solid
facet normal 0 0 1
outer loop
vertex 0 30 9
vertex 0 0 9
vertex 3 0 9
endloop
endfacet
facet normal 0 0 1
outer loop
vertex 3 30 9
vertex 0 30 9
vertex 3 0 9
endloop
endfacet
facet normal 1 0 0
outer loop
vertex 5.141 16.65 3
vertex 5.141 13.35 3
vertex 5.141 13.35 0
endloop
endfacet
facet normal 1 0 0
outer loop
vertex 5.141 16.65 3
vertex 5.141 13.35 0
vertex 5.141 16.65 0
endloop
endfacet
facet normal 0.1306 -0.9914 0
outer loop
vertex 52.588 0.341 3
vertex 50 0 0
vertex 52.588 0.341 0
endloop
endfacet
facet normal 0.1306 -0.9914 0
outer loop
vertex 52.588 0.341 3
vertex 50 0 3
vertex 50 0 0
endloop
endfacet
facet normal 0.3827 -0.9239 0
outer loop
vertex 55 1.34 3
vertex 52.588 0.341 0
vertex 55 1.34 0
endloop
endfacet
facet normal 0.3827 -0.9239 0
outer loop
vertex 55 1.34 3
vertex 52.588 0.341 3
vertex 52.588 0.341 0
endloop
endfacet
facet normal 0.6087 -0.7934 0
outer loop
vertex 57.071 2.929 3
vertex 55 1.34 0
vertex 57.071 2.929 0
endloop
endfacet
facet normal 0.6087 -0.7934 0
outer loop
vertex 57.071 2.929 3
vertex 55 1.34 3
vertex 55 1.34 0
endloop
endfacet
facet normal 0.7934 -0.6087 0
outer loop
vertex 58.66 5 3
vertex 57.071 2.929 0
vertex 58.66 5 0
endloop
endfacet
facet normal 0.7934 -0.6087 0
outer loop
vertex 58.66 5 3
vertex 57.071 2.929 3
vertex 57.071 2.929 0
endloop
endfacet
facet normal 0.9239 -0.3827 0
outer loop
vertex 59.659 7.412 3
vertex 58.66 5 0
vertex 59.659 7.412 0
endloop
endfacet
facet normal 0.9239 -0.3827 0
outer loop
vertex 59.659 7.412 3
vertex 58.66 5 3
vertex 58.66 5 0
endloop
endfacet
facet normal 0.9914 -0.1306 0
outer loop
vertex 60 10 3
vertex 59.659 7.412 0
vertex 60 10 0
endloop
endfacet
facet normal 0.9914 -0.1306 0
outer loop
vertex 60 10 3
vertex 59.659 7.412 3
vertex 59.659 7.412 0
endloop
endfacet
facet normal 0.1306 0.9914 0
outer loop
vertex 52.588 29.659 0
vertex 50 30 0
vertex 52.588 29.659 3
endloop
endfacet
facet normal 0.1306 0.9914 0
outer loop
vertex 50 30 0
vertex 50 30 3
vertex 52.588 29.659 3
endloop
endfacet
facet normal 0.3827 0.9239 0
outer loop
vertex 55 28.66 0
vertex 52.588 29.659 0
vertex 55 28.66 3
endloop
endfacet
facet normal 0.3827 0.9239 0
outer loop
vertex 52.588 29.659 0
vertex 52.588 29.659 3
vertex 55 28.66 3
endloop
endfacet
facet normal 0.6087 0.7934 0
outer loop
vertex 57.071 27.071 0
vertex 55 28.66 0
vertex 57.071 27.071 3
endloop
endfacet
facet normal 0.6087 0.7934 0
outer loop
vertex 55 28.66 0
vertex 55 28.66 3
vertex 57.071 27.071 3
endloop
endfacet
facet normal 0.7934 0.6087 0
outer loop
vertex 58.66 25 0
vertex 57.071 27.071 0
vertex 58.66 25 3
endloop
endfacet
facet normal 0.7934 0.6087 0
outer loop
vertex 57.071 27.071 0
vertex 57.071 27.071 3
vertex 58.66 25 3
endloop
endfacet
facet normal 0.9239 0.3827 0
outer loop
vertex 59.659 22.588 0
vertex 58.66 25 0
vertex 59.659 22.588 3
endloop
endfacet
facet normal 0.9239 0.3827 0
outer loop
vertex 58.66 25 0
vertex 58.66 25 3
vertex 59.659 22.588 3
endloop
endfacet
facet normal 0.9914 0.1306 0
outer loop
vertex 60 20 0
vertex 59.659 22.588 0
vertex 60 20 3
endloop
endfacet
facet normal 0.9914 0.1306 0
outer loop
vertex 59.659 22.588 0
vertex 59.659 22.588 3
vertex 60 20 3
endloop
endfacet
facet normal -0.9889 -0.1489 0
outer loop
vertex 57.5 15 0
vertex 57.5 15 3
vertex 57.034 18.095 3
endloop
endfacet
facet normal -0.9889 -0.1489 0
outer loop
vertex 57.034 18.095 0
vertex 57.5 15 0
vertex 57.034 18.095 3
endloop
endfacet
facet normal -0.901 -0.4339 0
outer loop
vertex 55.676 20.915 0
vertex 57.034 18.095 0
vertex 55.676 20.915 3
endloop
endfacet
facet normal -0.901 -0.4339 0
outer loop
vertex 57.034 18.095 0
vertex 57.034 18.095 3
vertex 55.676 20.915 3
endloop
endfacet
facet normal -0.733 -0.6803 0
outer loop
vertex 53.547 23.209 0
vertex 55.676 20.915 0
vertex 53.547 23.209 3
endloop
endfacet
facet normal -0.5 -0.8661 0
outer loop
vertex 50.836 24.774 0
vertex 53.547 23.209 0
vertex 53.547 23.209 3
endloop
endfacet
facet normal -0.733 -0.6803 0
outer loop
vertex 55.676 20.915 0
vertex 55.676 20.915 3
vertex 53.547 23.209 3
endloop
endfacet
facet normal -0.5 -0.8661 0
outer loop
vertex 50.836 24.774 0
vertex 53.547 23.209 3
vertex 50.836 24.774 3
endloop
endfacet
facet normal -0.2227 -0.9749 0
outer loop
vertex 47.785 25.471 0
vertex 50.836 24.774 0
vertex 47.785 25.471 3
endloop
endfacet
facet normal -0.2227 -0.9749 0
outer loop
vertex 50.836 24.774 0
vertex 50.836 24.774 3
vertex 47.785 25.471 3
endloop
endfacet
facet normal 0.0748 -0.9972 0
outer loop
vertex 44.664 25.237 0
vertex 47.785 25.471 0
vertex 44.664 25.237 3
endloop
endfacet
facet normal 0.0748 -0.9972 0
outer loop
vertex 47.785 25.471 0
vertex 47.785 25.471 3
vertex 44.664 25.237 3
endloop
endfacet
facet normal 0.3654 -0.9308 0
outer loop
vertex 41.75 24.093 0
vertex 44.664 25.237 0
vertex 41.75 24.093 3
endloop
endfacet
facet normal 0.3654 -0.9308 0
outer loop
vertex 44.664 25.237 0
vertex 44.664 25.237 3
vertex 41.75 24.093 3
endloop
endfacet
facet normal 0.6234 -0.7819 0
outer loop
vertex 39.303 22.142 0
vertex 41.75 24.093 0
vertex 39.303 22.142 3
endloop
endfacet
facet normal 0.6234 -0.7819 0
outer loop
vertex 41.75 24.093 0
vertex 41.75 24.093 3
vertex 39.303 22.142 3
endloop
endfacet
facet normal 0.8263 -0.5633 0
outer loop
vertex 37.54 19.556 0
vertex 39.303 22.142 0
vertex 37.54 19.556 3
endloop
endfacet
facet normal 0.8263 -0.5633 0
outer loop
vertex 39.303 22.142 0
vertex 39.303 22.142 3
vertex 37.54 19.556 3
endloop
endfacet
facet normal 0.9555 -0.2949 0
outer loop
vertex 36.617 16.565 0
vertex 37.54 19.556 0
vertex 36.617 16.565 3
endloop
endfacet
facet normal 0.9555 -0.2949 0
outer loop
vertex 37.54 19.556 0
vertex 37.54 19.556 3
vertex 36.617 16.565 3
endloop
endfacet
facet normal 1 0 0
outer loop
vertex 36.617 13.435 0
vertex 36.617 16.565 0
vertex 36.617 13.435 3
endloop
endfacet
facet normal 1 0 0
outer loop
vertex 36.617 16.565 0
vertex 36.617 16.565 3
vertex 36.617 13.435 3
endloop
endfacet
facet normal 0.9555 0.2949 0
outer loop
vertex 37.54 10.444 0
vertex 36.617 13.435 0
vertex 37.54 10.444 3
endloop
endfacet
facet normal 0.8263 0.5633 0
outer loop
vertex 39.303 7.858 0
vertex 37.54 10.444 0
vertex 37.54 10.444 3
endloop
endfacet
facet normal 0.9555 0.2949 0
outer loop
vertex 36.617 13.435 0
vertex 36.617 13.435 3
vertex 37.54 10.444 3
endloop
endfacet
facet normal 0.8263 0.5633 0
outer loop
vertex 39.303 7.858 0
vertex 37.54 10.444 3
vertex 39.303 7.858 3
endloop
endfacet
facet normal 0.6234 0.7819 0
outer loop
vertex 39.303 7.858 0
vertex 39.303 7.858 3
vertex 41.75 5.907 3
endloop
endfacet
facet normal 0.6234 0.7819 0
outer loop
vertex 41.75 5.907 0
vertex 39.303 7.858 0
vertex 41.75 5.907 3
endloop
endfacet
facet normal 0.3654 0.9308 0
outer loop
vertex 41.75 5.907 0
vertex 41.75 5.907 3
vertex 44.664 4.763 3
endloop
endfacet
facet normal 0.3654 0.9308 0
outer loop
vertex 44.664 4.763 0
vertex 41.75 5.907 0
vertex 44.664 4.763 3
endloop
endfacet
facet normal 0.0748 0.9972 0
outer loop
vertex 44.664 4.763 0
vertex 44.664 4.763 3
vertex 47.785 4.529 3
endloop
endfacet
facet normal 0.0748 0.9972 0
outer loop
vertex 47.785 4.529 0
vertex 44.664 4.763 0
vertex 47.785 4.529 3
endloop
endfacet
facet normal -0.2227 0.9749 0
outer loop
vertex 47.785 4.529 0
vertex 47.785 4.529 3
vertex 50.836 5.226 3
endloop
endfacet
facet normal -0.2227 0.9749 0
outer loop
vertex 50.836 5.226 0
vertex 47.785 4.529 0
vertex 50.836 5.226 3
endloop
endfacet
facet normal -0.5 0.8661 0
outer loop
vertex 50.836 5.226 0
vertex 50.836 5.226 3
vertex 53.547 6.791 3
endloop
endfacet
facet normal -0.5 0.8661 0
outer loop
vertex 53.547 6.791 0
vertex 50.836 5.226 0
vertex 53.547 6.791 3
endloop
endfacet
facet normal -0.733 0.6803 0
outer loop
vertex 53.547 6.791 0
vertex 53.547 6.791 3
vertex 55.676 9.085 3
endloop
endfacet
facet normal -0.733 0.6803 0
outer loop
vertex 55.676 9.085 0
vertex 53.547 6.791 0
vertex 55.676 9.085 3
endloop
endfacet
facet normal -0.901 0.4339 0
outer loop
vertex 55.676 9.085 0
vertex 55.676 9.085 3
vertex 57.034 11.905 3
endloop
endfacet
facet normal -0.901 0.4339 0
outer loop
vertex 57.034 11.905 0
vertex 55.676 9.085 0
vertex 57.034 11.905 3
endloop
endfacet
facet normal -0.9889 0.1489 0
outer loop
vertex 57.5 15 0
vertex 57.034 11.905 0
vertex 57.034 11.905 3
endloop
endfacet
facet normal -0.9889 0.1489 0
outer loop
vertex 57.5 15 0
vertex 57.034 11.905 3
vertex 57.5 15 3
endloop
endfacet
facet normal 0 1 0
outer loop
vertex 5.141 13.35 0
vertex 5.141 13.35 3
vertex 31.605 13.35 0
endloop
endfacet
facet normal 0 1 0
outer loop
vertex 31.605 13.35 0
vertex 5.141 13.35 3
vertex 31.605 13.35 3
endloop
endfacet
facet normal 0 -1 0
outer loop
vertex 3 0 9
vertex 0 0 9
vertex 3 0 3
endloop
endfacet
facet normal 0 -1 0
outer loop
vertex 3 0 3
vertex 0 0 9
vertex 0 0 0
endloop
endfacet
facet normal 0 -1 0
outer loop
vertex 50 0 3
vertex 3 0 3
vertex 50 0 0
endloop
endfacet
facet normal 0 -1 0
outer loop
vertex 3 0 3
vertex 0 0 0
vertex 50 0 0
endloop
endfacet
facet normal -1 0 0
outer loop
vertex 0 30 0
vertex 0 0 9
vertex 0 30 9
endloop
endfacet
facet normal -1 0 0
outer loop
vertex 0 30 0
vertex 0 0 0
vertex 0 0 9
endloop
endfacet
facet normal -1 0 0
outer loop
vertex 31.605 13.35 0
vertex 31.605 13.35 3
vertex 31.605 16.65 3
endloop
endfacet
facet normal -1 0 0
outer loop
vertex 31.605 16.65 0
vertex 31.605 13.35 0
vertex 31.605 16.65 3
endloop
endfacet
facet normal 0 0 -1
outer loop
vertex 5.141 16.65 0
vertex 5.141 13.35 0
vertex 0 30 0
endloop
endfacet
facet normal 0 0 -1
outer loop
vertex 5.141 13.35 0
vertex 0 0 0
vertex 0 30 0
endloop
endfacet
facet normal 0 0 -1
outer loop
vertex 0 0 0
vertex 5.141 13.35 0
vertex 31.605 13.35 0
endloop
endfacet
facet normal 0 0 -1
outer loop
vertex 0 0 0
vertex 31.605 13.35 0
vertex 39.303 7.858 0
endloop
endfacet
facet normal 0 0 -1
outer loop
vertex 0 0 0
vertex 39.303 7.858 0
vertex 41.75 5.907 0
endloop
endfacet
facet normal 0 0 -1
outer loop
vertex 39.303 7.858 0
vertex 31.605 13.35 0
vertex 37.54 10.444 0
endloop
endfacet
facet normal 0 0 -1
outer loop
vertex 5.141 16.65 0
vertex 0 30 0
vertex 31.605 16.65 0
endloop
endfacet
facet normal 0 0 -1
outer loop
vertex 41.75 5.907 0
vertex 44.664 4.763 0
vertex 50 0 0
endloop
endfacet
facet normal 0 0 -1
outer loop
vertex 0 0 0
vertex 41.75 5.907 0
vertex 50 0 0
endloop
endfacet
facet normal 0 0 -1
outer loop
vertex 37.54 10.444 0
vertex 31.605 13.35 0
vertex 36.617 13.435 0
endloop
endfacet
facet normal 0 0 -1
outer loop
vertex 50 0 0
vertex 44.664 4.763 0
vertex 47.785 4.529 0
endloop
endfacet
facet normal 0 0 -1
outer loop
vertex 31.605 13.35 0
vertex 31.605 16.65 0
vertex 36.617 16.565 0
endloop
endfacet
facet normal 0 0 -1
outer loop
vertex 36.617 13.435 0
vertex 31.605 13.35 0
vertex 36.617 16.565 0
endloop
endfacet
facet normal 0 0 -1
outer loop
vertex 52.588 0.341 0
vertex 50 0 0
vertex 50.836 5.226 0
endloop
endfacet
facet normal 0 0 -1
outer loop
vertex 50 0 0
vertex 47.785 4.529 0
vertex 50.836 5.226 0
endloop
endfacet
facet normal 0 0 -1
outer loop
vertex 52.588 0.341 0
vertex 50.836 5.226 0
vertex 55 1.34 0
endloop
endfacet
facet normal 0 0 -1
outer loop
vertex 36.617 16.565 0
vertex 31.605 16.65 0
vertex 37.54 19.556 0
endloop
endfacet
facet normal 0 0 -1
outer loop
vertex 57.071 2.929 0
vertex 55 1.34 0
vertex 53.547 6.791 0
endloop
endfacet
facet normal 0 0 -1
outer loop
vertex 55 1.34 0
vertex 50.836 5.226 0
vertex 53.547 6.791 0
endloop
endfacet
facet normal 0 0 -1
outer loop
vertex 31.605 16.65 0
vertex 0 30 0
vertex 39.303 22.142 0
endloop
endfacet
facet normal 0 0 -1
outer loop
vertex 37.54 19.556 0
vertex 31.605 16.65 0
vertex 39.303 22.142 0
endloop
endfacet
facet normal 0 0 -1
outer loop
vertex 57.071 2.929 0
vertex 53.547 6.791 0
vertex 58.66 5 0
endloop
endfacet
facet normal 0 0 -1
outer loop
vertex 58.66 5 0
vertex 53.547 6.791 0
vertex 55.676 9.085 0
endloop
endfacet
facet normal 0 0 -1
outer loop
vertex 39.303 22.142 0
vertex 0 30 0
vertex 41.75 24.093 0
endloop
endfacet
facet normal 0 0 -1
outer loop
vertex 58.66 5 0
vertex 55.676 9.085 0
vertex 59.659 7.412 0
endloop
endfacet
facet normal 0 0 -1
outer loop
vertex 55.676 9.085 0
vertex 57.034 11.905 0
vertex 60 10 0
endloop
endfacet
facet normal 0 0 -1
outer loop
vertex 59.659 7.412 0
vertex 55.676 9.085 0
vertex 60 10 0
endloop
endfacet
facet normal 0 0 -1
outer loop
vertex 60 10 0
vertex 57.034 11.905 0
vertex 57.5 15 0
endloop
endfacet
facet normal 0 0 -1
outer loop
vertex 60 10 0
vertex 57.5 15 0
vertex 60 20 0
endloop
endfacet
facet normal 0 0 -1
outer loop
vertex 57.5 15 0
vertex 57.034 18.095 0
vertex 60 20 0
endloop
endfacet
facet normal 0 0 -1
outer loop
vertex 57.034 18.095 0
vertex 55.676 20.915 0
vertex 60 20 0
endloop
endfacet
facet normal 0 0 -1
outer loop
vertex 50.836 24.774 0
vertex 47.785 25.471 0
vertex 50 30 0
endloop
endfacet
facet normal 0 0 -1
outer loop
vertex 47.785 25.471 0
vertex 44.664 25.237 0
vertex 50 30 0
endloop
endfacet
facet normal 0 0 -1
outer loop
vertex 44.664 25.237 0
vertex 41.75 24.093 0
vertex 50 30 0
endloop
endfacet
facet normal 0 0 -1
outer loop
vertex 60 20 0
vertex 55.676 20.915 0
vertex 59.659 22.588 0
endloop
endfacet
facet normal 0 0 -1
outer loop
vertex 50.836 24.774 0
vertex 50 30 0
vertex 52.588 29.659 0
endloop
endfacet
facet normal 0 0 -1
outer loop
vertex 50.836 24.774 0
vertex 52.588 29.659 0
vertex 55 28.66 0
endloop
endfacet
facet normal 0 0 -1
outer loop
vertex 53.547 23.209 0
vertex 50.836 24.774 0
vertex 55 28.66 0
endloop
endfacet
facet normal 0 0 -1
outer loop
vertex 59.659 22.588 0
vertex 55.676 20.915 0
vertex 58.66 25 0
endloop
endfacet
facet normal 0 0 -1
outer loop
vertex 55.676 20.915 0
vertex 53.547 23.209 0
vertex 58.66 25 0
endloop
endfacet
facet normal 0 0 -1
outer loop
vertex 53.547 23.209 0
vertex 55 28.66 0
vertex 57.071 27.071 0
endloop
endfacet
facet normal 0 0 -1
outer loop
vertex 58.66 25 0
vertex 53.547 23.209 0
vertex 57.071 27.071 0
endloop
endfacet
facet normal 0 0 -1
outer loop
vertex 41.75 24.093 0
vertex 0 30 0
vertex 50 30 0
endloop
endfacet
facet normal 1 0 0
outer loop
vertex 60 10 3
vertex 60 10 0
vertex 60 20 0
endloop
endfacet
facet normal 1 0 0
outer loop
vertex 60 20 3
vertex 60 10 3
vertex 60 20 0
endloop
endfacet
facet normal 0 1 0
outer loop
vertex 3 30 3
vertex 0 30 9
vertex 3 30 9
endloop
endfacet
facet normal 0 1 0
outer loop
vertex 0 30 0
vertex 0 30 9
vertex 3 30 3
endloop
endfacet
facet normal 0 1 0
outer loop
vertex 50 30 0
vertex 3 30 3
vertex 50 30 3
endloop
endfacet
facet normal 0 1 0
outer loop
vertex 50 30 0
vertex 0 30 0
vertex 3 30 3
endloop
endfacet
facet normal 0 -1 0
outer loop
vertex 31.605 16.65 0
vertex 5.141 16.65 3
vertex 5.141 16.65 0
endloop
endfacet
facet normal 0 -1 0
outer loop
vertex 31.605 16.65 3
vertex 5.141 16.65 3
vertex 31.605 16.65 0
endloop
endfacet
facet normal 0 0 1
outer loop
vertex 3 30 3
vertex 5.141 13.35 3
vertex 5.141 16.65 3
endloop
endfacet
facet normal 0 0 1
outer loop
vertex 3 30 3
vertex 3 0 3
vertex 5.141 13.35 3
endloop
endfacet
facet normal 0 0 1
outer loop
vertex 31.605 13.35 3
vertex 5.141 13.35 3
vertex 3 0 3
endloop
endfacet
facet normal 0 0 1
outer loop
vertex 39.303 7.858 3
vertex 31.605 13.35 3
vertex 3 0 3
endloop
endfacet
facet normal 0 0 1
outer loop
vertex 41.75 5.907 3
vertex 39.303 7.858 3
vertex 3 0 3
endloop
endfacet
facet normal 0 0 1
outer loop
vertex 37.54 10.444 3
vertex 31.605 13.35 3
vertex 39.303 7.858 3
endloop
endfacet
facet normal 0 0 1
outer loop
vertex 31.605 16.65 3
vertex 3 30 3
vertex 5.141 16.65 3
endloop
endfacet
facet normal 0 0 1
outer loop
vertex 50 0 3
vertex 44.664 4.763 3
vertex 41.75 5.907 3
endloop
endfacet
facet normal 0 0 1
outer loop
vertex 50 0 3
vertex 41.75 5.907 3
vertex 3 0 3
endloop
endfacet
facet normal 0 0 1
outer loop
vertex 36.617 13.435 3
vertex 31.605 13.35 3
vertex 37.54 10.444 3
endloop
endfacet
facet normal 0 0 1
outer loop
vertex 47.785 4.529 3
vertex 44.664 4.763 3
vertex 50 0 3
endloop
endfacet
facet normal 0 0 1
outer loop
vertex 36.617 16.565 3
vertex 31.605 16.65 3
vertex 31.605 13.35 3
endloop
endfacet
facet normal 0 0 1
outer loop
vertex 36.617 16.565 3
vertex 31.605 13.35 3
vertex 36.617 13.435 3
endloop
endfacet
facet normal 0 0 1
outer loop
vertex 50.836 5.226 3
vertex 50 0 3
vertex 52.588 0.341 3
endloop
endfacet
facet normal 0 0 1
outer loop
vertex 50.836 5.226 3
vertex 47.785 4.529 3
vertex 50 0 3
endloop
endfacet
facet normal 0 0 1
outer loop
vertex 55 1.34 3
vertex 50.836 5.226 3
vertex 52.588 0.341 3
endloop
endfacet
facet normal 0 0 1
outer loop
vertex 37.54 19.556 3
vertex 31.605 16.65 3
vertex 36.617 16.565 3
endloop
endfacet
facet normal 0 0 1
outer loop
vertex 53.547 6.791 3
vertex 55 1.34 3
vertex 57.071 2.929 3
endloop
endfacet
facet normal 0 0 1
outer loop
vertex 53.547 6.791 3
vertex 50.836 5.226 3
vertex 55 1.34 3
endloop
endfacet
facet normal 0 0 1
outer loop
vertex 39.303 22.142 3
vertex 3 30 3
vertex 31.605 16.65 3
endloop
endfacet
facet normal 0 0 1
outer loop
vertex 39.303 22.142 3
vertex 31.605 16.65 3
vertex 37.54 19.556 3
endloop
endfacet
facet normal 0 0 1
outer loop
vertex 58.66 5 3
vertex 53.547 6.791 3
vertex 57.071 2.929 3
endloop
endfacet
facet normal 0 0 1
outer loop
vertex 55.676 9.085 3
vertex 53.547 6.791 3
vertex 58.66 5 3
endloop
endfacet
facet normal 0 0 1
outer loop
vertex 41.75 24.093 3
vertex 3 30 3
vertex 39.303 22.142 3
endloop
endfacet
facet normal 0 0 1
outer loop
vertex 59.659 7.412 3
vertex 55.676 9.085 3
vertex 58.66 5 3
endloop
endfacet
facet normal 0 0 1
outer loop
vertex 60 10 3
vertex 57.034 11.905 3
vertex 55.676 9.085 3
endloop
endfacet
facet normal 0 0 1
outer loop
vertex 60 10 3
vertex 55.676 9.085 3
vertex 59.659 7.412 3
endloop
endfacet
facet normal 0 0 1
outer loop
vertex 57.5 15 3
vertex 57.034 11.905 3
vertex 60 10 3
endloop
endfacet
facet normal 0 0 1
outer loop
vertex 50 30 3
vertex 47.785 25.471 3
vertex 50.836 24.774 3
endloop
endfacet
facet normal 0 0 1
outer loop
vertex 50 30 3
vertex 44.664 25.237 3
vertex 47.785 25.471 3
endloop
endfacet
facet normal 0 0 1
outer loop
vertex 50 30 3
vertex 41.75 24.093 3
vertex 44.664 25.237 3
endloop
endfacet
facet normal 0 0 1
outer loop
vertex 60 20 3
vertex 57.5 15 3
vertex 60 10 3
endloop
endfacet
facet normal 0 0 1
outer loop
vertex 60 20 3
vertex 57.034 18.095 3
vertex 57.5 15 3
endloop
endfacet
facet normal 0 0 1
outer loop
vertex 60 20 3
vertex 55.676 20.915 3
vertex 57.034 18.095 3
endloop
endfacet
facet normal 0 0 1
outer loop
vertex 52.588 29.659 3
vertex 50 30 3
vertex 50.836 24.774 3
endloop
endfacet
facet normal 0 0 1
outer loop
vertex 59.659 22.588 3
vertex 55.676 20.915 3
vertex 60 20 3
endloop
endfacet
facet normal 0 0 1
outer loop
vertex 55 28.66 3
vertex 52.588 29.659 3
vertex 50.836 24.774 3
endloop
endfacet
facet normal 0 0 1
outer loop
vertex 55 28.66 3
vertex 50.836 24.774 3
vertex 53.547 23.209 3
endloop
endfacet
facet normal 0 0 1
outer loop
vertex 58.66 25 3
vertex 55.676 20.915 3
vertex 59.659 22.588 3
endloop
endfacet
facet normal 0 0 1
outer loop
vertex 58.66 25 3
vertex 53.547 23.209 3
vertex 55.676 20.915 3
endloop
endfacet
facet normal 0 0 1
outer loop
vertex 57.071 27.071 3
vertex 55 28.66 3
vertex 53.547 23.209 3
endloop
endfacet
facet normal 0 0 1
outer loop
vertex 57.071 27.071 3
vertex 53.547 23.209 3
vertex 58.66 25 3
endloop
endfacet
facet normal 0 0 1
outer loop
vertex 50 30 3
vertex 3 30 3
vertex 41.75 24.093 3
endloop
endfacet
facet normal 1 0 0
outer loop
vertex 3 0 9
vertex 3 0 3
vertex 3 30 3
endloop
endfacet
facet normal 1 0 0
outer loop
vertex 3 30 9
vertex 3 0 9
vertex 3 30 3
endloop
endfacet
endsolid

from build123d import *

# Parameters (mm, degrees)
SKETCH_1_W          = 60
SKETCH_1_H          = 30
EXTRUDE_1_DEPTH     = 3
SKETCH_2_W          = 3
SKETCH_2_H          = 30
EXTRUDE_2_DEPTH     = 6
SKETCH_3_R          = 10.5
CUT_EXTRUDE_1_DEPTH = 6
FILLET_1_R          = 10
SKETCH_4_W          = 26.464102696
SKETCH_4_H          = 3.3
CUT_EXTRUDE_2_DEPTH = 6


with BuildPart() as part:
    # 草图1 → 凸台-拉伸1 (new body)
    with BuildSketch(Plane.XY):
        with Locations((30, 15)):
            Rectangle(SKETCH_1_W, SKETCH_1_H)
    extrude(amount=EXTRUDE_1_DEPTH)

    # 草图2 → 凸台-拉伸2 (add)
    with BuildSketch(Plane.XY.offset(3)):
        with Locations((1.5, 15)):
            Rectangle(SKETCH_2_W, SKETCH_2_H)
    extrude(amount=EXTRUDE_2_DEPTH)

    # 草图3 → 切除-拉伸1 (cut)
    with BuildSketch(Plane.XY.offset(3)):
        with Locations((47, 15)):
            Circle(SKETCH_3_R)
    extrude(amount=-CUT_EXTRUDE_1_DEPTH, mode=Mode.SUBTRACT)

    # 圆角1
    fillet_1_edges = [part.edges().sort_by_distance(p)[0] for p in [
        (60, 30, 1.5),
        (60, 0, 1.5),
    ]]
    fillet(fillet_1_edges, radius=FILLET_1_R)

    # 草图4 → 切除-拉伸2 (cut)
    with BuildSketch(Plane.XY.offset(3)):
        with Locations((18.373081002, 15)):
            Rectangle(SKETCH_4_W, SKETCH_4_H)
    extrude(amount=-CUT_EXTRUDE_2_DEPTH, mode=Mode.SUBTRACT)


solid = part.part
